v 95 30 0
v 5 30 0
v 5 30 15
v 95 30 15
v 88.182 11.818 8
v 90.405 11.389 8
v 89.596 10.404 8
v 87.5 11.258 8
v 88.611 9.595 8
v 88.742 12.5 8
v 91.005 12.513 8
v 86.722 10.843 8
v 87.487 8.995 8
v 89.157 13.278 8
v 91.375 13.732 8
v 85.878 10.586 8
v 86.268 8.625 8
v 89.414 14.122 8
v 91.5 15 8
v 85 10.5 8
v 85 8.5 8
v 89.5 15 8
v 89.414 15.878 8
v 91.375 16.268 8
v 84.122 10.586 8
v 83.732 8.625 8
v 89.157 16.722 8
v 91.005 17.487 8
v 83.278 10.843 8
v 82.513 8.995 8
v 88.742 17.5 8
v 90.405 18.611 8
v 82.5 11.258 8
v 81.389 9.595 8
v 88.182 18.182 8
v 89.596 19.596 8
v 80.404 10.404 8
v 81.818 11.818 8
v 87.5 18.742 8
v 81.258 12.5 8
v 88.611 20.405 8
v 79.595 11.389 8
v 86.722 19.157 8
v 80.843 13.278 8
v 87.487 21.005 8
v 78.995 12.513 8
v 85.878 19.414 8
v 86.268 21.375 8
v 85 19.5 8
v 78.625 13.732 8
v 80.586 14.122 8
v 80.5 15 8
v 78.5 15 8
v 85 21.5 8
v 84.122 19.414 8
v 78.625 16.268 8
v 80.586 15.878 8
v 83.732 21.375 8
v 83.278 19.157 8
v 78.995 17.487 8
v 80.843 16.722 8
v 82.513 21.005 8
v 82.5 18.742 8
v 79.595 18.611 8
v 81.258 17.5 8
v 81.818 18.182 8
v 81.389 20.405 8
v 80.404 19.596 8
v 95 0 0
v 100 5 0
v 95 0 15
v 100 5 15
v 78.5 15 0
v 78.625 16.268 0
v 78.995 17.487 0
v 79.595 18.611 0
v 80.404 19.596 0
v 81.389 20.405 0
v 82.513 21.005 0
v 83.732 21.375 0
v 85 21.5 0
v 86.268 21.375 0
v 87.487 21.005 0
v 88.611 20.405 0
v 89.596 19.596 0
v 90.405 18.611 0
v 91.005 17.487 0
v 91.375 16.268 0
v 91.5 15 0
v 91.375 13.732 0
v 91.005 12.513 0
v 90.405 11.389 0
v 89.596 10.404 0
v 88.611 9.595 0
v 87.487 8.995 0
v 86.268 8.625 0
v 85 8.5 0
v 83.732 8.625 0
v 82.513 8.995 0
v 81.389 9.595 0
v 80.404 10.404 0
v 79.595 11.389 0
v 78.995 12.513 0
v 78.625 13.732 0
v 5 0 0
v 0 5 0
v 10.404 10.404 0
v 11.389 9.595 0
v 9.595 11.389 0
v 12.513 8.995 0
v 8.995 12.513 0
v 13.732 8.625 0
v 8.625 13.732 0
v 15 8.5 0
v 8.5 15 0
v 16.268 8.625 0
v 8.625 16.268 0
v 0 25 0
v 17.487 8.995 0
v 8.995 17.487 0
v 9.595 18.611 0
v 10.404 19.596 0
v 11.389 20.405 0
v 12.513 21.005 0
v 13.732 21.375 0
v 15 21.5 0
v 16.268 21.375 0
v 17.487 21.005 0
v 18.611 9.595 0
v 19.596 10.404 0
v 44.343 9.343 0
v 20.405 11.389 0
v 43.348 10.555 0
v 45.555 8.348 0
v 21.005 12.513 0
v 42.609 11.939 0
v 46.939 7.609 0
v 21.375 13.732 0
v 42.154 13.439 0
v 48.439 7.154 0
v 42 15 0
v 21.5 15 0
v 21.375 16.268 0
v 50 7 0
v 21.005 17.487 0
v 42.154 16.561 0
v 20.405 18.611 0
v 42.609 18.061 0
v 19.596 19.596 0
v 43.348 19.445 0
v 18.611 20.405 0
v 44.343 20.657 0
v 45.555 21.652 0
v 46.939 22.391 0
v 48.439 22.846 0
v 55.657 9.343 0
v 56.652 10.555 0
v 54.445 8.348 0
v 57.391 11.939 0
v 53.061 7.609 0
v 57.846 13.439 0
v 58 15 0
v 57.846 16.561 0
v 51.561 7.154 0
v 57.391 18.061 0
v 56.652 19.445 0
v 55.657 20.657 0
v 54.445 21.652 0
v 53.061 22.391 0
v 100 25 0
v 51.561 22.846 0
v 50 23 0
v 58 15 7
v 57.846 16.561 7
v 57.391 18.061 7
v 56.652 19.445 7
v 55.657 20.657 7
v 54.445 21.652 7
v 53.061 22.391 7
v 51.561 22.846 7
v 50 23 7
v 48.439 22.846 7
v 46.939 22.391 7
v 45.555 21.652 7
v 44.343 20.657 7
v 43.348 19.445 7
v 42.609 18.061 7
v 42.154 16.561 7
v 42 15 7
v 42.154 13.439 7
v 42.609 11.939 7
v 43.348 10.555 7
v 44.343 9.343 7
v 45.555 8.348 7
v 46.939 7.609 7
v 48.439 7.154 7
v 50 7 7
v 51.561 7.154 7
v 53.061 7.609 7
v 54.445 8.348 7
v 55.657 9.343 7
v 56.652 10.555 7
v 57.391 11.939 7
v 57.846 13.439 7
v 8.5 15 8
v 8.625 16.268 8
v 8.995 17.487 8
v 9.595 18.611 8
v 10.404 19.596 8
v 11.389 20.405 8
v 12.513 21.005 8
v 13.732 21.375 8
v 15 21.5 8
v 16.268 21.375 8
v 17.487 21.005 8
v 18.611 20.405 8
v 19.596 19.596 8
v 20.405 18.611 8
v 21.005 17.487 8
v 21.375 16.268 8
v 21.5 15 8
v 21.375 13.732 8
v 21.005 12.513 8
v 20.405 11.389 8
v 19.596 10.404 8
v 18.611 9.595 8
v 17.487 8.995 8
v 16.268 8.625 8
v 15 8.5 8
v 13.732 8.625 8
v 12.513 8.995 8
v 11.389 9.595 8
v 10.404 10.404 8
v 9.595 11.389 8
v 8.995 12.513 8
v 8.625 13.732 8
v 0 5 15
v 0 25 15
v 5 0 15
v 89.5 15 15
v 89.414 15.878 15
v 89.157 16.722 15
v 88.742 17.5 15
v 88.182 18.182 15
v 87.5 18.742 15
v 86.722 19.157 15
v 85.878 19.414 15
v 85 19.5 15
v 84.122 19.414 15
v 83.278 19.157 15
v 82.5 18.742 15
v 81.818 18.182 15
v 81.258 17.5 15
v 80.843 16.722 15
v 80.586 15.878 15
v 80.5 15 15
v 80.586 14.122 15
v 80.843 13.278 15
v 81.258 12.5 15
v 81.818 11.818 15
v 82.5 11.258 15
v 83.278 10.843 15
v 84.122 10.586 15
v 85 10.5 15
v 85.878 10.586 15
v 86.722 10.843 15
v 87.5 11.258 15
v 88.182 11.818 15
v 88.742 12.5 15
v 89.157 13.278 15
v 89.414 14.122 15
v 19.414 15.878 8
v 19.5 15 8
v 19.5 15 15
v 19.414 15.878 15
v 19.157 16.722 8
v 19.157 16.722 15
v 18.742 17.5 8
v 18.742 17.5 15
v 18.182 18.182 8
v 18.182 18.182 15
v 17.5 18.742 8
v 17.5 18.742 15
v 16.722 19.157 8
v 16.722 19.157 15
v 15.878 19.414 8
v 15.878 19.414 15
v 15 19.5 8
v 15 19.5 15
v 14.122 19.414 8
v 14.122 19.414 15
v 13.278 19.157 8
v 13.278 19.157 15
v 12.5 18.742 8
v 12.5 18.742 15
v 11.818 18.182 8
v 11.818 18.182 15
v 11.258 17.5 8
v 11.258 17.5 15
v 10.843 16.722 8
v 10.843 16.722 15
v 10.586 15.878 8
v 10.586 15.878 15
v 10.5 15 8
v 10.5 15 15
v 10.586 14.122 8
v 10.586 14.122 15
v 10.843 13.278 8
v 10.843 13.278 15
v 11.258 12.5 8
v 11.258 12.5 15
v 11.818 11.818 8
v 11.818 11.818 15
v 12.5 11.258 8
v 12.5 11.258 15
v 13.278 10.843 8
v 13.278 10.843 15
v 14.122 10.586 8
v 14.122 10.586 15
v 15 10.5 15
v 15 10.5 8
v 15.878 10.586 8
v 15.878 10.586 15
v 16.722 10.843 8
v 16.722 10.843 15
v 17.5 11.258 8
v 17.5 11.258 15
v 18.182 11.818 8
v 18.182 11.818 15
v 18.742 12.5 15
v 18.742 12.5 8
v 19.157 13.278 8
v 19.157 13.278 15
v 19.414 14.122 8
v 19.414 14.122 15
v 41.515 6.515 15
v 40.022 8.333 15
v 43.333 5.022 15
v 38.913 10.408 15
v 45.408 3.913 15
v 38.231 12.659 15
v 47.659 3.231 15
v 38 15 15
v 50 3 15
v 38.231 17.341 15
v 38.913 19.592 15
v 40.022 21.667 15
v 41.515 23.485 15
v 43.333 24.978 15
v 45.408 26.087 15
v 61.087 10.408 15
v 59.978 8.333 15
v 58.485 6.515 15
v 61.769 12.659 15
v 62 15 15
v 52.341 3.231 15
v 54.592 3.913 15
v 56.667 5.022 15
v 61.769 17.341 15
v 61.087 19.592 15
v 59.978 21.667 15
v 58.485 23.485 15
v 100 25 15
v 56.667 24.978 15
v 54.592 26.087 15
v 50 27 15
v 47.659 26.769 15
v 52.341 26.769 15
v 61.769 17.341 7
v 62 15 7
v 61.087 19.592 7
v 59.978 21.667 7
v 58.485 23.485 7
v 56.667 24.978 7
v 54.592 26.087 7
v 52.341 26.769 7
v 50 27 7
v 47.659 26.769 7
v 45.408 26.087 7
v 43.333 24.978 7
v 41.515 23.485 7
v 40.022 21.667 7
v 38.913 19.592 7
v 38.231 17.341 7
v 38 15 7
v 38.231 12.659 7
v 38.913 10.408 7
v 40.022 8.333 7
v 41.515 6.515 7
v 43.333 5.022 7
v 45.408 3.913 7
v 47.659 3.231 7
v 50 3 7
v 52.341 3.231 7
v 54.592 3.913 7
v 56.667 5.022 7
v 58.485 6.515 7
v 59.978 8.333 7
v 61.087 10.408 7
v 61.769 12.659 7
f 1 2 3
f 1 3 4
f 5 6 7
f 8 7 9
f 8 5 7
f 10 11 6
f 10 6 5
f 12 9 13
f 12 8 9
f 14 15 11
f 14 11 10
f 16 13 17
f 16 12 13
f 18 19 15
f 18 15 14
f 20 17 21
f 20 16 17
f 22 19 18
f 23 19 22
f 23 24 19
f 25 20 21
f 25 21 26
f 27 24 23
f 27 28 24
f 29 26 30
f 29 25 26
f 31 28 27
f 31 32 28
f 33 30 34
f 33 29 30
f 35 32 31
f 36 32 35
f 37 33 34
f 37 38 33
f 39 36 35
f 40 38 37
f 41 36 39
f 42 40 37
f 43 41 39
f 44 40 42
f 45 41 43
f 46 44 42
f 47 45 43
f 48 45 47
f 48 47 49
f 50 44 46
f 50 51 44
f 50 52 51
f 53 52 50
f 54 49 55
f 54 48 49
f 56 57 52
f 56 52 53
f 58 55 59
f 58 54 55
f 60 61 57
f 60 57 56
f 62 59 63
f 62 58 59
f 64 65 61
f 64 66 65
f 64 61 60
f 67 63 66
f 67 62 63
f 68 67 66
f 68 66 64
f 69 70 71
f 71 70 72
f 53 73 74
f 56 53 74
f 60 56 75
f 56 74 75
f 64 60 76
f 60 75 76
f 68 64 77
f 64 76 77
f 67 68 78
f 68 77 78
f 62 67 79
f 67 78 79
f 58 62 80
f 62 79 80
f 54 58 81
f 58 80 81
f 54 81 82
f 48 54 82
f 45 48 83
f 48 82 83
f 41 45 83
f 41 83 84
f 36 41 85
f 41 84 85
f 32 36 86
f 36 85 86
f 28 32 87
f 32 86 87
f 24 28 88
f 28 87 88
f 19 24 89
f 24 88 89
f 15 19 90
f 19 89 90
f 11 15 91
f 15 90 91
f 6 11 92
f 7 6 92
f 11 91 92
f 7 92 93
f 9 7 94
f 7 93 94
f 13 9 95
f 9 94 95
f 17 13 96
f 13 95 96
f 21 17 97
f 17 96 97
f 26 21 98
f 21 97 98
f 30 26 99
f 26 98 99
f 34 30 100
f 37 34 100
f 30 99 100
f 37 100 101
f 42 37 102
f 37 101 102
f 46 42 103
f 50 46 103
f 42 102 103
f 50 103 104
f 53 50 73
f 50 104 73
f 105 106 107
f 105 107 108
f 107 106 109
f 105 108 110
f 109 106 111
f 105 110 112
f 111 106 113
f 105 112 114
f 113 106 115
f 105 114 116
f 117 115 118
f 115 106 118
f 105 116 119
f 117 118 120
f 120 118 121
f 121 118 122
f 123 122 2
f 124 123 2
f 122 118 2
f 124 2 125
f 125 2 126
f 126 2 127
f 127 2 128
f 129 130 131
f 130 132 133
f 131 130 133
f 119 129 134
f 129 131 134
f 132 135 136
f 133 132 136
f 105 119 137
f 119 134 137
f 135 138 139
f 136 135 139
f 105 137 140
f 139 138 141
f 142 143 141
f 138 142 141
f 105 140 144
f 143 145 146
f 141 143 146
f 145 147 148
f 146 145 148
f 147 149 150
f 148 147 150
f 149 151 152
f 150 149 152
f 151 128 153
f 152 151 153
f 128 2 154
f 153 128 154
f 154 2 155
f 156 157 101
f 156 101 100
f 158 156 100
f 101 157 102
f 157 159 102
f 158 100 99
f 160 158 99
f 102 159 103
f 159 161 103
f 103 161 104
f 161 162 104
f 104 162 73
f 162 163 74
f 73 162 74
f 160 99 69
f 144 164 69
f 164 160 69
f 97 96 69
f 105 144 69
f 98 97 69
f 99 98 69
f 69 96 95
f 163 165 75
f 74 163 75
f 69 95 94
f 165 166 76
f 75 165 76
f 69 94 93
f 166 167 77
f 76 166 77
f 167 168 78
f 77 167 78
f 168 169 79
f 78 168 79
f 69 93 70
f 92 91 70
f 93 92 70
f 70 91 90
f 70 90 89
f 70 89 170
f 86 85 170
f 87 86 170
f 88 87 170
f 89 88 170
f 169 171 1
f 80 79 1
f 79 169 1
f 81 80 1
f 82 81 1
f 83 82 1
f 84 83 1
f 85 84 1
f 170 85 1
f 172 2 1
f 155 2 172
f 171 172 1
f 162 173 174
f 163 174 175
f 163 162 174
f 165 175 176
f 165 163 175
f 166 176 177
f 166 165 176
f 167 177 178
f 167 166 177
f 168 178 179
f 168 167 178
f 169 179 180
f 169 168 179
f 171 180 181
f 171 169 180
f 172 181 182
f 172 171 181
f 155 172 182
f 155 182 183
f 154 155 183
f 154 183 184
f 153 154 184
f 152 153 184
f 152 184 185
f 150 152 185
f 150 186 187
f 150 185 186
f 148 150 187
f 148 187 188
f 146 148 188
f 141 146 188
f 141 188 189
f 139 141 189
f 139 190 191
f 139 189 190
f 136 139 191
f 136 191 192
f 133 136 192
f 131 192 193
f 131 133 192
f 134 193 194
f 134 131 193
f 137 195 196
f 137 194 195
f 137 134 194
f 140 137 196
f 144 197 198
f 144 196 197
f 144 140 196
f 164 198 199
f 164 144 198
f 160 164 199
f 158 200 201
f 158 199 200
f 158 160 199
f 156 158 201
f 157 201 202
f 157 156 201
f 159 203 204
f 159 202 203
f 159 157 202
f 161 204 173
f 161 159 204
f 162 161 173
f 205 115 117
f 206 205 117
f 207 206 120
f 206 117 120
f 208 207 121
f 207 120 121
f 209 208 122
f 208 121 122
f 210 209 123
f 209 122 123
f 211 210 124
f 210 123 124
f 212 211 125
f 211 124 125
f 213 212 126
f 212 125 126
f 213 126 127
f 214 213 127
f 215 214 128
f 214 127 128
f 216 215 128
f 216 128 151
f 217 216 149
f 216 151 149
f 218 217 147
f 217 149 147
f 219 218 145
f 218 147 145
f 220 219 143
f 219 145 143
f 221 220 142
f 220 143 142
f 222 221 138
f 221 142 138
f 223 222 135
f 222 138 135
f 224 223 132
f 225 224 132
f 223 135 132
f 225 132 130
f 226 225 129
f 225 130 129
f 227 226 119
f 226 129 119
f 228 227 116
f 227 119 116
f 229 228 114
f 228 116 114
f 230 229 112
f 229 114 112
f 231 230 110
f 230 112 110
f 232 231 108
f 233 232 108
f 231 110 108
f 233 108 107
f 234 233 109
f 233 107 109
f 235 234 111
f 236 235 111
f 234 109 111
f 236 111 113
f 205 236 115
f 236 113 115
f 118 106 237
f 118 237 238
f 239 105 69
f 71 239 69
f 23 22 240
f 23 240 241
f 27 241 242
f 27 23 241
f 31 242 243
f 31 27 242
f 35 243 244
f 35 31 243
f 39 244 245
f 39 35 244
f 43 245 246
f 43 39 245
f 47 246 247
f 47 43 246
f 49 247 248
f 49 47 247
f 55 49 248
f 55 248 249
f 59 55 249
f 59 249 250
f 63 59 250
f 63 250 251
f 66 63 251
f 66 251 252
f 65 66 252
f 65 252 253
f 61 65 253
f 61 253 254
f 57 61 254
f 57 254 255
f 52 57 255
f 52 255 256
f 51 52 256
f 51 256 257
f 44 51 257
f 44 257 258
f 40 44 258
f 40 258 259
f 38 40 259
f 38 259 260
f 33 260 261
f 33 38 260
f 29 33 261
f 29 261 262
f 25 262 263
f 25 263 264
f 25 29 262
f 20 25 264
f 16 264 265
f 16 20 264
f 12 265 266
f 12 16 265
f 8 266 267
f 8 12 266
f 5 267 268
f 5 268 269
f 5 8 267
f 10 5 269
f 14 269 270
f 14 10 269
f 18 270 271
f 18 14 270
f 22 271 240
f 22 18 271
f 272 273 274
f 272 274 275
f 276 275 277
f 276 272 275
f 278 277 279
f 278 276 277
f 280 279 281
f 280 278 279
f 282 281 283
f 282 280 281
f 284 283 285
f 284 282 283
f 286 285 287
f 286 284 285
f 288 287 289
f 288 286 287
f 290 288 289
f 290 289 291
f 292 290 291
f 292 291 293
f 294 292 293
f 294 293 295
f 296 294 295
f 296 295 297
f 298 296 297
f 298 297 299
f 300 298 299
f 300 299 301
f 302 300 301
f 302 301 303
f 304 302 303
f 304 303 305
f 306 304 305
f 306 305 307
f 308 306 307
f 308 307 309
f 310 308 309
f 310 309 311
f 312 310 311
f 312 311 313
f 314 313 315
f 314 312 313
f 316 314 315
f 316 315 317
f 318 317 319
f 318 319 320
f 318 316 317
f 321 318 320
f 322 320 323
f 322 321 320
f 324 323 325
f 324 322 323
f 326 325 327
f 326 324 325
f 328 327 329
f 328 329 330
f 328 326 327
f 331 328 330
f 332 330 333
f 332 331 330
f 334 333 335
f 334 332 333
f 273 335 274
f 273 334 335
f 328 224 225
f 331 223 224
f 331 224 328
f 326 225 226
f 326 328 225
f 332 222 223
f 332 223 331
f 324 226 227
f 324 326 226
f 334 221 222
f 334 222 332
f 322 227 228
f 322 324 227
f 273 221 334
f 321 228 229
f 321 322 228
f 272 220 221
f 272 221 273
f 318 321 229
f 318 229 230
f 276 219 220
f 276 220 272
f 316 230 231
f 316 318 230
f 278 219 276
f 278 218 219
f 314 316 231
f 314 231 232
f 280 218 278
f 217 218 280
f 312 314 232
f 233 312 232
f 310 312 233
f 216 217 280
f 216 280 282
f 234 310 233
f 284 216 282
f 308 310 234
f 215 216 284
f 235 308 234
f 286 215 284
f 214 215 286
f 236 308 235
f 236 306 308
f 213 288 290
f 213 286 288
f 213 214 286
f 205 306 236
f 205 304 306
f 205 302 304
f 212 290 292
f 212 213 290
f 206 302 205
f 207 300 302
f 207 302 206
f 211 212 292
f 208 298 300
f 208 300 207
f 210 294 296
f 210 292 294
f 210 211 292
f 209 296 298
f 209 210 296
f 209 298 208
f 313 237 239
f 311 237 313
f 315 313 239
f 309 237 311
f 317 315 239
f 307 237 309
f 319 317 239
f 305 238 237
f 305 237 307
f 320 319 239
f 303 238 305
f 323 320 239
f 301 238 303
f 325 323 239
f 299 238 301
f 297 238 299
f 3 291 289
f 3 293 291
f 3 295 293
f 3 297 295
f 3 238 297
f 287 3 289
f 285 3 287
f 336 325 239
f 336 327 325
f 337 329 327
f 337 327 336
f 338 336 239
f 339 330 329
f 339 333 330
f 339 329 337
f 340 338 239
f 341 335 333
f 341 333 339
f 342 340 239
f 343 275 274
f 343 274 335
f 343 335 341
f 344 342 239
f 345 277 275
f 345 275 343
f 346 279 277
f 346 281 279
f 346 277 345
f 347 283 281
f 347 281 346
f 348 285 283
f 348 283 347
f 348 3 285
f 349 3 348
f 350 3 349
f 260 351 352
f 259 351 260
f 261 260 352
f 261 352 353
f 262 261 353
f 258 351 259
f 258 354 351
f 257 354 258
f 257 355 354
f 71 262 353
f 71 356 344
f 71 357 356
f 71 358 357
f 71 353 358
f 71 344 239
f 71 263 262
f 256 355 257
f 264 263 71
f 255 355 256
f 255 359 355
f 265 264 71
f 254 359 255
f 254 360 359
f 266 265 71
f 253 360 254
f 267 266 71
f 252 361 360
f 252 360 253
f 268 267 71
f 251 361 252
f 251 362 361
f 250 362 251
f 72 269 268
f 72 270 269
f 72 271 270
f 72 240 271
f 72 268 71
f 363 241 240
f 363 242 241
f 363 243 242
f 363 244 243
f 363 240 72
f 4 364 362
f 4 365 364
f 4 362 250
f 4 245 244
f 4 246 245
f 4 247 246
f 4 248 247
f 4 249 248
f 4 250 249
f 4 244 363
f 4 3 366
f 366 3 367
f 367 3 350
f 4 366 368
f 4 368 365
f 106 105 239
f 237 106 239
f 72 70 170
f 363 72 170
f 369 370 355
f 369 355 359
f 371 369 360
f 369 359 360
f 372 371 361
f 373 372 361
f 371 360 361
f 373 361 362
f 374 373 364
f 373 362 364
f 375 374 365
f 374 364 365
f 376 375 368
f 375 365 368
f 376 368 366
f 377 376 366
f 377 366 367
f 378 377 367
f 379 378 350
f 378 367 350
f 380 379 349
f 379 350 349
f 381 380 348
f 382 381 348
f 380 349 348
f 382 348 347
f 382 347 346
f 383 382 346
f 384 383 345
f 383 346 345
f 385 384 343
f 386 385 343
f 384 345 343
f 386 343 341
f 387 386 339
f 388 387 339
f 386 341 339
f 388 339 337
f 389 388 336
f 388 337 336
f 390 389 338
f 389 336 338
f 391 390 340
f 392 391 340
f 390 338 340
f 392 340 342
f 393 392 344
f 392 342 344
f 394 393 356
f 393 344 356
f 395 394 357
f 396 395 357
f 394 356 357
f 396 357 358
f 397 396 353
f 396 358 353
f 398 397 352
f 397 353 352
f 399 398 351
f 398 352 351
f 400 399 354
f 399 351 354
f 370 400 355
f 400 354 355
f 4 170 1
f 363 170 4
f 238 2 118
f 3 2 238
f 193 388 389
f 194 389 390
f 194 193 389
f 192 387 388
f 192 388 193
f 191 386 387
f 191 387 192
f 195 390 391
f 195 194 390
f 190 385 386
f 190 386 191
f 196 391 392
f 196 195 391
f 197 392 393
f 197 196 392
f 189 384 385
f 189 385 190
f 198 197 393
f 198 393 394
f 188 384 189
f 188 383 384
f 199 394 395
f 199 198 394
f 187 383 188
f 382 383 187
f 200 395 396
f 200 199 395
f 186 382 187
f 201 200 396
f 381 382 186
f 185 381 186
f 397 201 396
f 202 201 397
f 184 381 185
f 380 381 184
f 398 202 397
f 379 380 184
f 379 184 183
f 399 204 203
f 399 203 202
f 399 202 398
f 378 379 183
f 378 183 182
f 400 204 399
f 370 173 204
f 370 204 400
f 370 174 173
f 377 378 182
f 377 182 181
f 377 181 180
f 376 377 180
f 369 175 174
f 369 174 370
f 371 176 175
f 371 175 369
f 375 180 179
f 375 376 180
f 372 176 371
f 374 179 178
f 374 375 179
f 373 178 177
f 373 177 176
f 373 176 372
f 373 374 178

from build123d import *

# Parameters (mm, degrees)
SKETCH_1_W          = 100
SKETCH_1_H          = 30
SKETCH_1_R          = 4.5
SKETCH_1_R_2        = 8
EXTRUDE_1_DEPTH     = 15
SKETCH_2_R          = 12
CUT_EXTRUDE_1_DEPTH = 8
SKETCH_3_R          = 6.5
CUT_EXTRUDE_2_DEPTH = 8
CHAMFER_1_SIZE      = 5


with BuildPart() as part:
    # 草图1 → 凸台-拉伸1 (new body)
    with BuildSketch(Plane.XY):
        with Locations((50, 15)):
            Rectangle(SKETCH_1_W, SKETCH_1_H)
        with Locations((15, 15)):
            Circle(SKETCH_1_R, mode=Mode.SUBTRACT)
        with Locations((50, 15)):
            Circle(SKETCH_1_R_2, mode=Mode.SUBTRACT)
        with Locations((85, 15)):
            Circle(SKETCH_1_R, mode=Mode.SUBTRACT)
    extrude(amount=EXTRUDE_1_DEPTH)

    # 草图2 → 切除-拉伸1 (cut)
    with BuildSketch(Plane.XY.offset(15)):
        with Locations((50, 15)):
            Circle(SKETCH_2_R)
    extrude(amount=-CUT_EXTRUDE_1_DEPTH, mode=Mode.SUBTRACT)

    # 草图3 → 切除-拉伸2 (cut)
    with BuildSketch(Plane(origin=(0, 0, 0), x_dir=(-1, 0, 0), z_dir=(0, 0, -1))):
        with Locations((-85, 15)):
            Circle(SKETCH_3_R)
        with Locations((-15, 15)):
            Circle(SKETCH_3_R)
    extrude(amount=-CUT_EXTRUDE_2_DEPTH, mode=Mode.SUBTRACT)

    # 倒角1
    chamfer_1_edges = [part.edges().sort_by_distance(p)[0] for p in [
        (0, 30, 7.5),
        (100, 30, 7.5),
        (100, 0, 7.5),
        (0, 0, 7.5),
    ]]
    chamfer(chamfer_1_edges, length=CHAMFER_1_SIZE)


solid = part.part
